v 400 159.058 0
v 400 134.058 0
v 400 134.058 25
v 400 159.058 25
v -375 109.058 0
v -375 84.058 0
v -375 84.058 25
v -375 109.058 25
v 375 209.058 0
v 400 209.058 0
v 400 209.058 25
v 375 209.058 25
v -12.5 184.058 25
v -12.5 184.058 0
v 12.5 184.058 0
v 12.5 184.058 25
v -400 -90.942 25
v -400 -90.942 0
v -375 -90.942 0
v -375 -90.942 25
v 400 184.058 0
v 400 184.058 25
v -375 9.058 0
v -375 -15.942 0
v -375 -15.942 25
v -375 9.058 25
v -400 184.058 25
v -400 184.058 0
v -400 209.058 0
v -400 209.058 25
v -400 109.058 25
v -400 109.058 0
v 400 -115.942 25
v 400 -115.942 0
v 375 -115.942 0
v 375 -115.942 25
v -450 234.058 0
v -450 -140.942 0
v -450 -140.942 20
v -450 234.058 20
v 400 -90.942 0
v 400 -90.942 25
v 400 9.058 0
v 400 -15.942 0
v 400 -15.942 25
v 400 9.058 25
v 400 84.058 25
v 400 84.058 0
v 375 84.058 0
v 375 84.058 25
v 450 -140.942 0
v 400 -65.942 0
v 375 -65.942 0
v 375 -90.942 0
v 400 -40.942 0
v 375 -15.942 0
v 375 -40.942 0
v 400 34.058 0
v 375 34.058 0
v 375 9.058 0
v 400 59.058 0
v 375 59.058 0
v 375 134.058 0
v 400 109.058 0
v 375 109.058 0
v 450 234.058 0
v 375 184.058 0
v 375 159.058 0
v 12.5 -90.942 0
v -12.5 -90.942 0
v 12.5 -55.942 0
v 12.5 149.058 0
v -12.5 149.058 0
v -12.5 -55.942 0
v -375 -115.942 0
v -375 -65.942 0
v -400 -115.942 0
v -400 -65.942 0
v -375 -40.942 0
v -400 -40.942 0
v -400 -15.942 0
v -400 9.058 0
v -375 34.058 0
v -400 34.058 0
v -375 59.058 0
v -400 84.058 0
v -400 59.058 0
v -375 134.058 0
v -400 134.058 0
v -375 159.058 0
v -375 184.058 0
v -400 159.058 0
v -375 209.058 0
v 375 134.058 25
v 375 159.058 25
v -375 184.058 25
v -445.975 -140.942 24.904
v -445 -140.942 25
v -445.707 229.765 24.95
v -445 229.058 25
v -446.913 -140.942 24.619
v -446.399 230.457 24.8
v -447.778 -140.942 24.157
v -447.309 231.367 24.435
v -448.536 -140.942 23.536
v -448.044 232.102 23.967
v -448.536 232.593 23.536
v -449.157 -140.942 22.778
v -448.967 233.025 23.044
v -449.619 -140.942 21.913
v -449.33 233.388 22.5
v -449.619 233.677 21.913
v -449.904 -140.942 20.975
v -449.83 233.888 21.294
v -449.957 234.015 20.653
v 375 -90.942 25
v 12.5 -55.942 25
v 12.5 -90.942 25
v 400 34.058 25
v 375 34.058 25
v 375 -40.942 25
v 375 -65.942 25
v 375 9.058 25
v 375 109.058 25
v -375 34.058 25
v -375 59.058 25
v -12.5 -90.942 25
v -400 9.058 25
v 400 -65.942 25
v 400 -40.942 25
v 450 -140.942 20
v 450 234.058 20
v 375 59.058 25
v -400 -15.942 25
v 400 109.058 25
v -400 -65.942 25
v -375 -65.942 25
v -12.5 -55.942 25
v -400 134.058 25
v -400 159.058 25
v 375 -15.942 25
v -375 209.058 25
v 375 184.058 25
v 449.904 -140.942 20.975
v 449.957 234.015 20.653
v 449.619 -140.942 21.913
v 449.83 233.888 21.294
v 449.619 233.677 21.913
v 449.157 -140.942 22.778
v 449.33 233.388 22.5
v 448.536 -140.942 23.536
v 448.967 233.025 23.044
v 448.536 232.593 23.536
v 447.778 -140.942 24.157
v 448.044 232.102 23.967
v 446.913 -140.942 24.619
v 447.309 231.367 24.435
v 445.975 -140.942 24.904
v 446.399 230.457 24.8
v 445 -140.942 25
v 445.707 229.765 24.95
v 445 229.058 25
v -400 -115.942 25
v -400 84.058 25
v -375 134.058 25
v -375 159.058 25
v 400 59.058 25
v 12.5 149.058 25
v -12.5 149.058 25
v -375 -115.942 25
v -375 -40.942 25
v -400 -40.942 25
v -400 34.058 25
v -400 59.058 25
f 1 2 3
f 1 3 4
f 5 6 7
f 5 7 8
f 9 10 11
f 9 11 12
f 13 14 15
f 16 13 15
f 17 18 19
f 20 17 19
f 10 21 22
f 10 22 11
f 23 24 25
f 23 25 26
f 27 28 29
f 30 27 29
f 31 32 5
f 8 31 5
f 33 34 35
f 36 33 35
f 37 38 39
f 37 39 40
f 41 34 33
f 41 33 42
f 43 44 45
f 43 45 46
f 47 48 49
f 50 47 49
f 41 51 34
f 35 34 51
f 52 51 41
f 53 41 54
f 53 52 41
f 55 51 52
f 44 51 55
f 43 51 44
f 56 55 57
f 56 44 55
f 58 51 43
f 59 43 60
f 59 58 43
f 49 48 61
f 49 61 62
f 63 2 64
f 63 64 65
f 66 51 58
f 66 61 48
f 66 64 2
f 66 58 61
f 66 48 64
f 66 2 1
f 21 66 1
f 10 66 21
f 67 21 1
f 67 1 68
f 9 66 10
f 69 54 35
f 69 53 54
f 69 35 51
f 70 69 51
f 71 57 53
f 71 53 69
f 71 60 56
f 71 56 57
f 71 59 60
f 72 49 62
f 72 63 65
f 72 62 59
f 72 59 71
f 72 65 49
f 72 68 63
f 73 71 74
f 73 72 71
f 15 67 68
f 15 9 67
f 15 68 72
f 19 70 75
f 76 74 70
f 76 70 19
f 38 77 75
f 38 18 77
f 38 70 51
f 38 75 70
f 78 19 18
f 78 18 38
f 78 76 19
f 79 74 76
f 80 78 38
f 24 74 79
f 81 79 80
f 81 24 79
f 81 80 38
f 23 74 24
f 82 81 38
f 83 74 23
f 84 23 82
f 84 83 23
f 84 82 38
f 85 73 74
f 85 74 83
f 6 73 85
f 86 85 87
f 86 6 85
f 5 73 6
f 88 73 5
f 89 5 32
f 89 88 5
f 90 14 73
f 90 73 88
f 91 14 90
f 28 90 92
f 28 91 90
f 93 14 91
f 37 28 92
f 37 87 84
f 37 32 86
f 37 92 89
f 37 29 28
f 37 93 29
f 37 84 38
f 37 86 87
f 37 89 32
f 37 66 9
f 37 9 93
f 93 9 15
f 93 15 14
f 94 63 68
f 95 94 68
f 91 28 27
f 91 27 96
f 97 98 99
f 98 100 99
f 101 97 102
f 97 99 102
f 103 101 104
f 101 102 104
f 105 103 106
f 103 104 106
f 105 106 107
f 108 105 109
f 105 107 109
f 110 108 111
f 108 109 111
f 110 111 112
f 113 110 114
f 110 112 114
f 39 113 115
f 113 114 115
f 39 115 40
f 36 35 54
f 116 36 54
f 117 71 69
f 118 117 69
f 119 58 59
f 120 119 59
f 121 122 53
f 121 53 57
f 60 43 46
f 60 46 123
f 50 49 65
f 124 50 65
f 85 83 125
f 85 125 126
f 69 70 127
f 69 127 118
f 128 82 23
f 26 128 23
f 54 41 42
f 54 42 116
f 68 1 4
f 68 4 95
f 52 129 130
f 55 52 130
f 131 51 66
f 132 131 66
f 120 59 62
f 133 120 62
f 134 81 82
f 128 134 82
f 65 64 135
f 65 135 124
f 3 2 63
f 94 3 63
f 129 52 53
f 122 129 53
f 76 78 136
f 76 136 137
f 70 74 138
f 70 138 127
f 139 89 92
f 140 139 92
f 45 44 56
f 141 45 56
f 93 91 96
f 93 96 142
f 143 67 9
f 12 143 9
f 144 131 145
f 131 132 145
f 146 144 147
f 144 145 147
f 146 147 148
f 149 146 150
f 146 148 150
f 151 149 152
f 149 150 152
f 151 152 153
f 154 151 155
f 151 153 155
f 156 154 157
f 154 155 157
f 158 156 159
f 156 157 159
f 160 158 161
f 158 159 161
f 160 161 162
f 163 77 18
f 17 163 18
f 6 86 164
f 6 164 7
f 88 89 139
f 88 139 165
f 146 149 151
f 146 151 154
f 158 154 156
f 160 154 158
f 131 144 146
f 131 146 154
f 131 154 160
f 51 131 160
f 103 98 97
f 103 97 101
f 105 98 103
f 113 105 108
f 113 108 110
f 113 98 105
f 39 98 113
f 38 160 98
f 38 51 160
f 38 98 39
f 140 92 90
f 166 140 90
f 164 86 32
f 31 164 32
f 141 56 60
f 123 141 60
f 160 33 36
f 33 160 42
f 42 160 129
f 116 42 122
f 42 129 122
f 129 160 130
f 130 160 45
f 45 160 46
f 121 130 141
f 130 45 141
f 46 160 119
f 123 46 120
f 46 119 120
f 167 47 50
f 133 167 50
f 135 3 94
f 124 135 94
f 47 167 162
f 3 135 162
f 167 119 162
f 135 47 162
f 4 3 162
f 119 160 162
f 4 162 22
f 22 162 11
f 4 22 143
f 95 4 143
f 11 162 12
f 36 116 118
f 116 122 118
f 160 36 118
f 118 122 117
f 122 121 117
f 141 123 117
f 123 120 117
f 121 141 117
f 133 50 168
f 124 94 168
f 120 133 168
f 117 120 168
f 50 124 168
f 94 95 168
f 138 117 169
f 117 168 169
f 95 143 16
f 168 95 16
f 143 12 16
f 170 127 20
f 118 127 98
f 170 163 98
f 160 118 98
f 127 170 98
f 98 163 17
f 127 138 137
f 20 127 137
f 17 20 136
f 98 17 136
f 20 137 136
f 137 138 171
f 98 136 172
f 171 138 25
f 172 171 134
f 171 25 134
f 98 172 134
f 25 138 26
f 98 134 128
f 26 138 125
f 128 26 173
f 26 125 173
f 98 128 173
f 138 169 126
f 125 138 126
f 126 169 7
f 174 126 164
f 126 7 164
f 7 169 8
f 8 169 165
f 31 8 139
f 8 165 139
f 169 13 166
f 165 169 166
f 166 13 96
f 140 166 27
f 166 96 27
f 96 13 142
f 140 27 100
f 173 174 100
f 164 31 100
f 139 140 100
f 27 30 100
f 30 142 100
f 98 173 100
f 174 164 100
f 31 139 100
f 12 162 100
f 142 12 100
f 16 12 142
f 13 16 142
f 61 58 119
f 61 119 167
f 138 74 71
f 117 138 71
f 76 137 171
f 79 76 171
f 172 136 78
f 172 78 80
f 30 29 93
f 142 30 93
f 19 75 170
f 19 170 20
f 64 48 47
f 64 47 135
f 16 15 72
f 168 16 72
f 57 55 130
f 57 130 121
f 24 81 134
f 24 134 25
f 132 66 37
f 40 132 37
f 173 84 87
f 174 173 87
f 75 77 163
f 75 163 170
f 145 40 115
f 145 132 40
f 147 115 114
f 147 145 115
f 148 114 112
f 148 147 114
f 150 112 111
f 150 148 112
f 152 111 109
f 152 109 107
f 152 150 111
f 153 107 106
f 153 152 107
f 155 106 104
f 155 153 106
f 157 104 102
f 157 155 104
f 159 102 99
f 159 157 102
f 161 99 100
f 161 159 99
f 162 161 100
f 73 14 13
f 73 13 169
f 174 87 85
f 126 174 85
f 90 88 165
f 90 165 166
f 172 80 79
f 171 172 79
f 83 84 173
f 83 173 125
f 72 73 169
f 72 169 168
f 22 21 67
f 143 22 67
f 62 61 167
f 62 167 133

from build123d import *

# Parameters (mm, degrees)
F0_W     = 450
F0_H     = 375
F0_W_2   = 25
F0_H_2   = 25
F1_DEPTH = 25
F3_W     = 25
F3_H     = 35
F4_DEPTH = 25
F5_R     = 5


with BuildPart() as f1:
    # F0 (on Top) → F1 (new body)
    with BuildSketch(Plane.XY):
        with Locations((-225, 46.5578983041)):
            Rectangle(F0_W, F0_H)
        with Locations((-387.5, -103.4421016959)):
            Rectangle(F0_W_2, F0_H_2, mode=Mode.SUBTRACT)
        with Locations((-387.5, -53.4421016959)):
            Rectangle(F0_W_2, F0_H_2, mode=Mode.SUBTRACT)
        with Locations((-387.5, -3.4421016959)):
            Rectangle(F0_W_2, F0_H_2, mode=Mode.SUBTRACT)
        with Locations((-387.5, 46.5578983041)):
            Rectangle(F0_W_2, F0_H_2, mode=Mode.SUBTRACT)
        with Locations((-387.5, 96.5578983041)):
            Rectangle(F0_W_2, F0_H_2, mode=Mode.SUBTRACT)
        with Locations((-387.5, 146.5578983041)):
            Rectangle(F0_W_2, F0_H_2, mode=Mode.SUBTRACT)
        with Locations((-387.5, 196.5578983041)):
            Rectangle(F0_W_2, F0_H_2, mode=Mode.SUBTRACT)
    extrude(amount=F1_DEPTH)

    # F2: F1 across face


with BuildPart() as f1_1:
    add(f1.part)
    add(f1.part.mirror(Plane(origin=(0, 46.5578983041, 12.5), x_dir=(0, 1, 0), z_dir=(1, 0, 0))))

    # F3 (on face) → F4 (cut)
    with BuildSketch(Plane(origin=(0, 0, 0), x_dir=(1, 0, 0), z_dir=(0, 0, -1))):
        with Locations((0, -166.5578983041)):
            Rectangle(F3_W, F3_H)
        with Locations((0, 73.4421016959)):
            Rectangle(F3_W, F3_H)
    extrude(amount=-F4_DEPTH, mode=Mode.SUBTRACT)

    # F5
    f5_edges = [f1_1.edges().sort_by_distance(p)[0] for p in [
        (0, 234.057898, 25),
        (450, 46.557898, 25),
        (-450, 46.557898, 25),
    ]]
    fillet(f5_edges, radius=F5_R)


solid = f1_1.part
